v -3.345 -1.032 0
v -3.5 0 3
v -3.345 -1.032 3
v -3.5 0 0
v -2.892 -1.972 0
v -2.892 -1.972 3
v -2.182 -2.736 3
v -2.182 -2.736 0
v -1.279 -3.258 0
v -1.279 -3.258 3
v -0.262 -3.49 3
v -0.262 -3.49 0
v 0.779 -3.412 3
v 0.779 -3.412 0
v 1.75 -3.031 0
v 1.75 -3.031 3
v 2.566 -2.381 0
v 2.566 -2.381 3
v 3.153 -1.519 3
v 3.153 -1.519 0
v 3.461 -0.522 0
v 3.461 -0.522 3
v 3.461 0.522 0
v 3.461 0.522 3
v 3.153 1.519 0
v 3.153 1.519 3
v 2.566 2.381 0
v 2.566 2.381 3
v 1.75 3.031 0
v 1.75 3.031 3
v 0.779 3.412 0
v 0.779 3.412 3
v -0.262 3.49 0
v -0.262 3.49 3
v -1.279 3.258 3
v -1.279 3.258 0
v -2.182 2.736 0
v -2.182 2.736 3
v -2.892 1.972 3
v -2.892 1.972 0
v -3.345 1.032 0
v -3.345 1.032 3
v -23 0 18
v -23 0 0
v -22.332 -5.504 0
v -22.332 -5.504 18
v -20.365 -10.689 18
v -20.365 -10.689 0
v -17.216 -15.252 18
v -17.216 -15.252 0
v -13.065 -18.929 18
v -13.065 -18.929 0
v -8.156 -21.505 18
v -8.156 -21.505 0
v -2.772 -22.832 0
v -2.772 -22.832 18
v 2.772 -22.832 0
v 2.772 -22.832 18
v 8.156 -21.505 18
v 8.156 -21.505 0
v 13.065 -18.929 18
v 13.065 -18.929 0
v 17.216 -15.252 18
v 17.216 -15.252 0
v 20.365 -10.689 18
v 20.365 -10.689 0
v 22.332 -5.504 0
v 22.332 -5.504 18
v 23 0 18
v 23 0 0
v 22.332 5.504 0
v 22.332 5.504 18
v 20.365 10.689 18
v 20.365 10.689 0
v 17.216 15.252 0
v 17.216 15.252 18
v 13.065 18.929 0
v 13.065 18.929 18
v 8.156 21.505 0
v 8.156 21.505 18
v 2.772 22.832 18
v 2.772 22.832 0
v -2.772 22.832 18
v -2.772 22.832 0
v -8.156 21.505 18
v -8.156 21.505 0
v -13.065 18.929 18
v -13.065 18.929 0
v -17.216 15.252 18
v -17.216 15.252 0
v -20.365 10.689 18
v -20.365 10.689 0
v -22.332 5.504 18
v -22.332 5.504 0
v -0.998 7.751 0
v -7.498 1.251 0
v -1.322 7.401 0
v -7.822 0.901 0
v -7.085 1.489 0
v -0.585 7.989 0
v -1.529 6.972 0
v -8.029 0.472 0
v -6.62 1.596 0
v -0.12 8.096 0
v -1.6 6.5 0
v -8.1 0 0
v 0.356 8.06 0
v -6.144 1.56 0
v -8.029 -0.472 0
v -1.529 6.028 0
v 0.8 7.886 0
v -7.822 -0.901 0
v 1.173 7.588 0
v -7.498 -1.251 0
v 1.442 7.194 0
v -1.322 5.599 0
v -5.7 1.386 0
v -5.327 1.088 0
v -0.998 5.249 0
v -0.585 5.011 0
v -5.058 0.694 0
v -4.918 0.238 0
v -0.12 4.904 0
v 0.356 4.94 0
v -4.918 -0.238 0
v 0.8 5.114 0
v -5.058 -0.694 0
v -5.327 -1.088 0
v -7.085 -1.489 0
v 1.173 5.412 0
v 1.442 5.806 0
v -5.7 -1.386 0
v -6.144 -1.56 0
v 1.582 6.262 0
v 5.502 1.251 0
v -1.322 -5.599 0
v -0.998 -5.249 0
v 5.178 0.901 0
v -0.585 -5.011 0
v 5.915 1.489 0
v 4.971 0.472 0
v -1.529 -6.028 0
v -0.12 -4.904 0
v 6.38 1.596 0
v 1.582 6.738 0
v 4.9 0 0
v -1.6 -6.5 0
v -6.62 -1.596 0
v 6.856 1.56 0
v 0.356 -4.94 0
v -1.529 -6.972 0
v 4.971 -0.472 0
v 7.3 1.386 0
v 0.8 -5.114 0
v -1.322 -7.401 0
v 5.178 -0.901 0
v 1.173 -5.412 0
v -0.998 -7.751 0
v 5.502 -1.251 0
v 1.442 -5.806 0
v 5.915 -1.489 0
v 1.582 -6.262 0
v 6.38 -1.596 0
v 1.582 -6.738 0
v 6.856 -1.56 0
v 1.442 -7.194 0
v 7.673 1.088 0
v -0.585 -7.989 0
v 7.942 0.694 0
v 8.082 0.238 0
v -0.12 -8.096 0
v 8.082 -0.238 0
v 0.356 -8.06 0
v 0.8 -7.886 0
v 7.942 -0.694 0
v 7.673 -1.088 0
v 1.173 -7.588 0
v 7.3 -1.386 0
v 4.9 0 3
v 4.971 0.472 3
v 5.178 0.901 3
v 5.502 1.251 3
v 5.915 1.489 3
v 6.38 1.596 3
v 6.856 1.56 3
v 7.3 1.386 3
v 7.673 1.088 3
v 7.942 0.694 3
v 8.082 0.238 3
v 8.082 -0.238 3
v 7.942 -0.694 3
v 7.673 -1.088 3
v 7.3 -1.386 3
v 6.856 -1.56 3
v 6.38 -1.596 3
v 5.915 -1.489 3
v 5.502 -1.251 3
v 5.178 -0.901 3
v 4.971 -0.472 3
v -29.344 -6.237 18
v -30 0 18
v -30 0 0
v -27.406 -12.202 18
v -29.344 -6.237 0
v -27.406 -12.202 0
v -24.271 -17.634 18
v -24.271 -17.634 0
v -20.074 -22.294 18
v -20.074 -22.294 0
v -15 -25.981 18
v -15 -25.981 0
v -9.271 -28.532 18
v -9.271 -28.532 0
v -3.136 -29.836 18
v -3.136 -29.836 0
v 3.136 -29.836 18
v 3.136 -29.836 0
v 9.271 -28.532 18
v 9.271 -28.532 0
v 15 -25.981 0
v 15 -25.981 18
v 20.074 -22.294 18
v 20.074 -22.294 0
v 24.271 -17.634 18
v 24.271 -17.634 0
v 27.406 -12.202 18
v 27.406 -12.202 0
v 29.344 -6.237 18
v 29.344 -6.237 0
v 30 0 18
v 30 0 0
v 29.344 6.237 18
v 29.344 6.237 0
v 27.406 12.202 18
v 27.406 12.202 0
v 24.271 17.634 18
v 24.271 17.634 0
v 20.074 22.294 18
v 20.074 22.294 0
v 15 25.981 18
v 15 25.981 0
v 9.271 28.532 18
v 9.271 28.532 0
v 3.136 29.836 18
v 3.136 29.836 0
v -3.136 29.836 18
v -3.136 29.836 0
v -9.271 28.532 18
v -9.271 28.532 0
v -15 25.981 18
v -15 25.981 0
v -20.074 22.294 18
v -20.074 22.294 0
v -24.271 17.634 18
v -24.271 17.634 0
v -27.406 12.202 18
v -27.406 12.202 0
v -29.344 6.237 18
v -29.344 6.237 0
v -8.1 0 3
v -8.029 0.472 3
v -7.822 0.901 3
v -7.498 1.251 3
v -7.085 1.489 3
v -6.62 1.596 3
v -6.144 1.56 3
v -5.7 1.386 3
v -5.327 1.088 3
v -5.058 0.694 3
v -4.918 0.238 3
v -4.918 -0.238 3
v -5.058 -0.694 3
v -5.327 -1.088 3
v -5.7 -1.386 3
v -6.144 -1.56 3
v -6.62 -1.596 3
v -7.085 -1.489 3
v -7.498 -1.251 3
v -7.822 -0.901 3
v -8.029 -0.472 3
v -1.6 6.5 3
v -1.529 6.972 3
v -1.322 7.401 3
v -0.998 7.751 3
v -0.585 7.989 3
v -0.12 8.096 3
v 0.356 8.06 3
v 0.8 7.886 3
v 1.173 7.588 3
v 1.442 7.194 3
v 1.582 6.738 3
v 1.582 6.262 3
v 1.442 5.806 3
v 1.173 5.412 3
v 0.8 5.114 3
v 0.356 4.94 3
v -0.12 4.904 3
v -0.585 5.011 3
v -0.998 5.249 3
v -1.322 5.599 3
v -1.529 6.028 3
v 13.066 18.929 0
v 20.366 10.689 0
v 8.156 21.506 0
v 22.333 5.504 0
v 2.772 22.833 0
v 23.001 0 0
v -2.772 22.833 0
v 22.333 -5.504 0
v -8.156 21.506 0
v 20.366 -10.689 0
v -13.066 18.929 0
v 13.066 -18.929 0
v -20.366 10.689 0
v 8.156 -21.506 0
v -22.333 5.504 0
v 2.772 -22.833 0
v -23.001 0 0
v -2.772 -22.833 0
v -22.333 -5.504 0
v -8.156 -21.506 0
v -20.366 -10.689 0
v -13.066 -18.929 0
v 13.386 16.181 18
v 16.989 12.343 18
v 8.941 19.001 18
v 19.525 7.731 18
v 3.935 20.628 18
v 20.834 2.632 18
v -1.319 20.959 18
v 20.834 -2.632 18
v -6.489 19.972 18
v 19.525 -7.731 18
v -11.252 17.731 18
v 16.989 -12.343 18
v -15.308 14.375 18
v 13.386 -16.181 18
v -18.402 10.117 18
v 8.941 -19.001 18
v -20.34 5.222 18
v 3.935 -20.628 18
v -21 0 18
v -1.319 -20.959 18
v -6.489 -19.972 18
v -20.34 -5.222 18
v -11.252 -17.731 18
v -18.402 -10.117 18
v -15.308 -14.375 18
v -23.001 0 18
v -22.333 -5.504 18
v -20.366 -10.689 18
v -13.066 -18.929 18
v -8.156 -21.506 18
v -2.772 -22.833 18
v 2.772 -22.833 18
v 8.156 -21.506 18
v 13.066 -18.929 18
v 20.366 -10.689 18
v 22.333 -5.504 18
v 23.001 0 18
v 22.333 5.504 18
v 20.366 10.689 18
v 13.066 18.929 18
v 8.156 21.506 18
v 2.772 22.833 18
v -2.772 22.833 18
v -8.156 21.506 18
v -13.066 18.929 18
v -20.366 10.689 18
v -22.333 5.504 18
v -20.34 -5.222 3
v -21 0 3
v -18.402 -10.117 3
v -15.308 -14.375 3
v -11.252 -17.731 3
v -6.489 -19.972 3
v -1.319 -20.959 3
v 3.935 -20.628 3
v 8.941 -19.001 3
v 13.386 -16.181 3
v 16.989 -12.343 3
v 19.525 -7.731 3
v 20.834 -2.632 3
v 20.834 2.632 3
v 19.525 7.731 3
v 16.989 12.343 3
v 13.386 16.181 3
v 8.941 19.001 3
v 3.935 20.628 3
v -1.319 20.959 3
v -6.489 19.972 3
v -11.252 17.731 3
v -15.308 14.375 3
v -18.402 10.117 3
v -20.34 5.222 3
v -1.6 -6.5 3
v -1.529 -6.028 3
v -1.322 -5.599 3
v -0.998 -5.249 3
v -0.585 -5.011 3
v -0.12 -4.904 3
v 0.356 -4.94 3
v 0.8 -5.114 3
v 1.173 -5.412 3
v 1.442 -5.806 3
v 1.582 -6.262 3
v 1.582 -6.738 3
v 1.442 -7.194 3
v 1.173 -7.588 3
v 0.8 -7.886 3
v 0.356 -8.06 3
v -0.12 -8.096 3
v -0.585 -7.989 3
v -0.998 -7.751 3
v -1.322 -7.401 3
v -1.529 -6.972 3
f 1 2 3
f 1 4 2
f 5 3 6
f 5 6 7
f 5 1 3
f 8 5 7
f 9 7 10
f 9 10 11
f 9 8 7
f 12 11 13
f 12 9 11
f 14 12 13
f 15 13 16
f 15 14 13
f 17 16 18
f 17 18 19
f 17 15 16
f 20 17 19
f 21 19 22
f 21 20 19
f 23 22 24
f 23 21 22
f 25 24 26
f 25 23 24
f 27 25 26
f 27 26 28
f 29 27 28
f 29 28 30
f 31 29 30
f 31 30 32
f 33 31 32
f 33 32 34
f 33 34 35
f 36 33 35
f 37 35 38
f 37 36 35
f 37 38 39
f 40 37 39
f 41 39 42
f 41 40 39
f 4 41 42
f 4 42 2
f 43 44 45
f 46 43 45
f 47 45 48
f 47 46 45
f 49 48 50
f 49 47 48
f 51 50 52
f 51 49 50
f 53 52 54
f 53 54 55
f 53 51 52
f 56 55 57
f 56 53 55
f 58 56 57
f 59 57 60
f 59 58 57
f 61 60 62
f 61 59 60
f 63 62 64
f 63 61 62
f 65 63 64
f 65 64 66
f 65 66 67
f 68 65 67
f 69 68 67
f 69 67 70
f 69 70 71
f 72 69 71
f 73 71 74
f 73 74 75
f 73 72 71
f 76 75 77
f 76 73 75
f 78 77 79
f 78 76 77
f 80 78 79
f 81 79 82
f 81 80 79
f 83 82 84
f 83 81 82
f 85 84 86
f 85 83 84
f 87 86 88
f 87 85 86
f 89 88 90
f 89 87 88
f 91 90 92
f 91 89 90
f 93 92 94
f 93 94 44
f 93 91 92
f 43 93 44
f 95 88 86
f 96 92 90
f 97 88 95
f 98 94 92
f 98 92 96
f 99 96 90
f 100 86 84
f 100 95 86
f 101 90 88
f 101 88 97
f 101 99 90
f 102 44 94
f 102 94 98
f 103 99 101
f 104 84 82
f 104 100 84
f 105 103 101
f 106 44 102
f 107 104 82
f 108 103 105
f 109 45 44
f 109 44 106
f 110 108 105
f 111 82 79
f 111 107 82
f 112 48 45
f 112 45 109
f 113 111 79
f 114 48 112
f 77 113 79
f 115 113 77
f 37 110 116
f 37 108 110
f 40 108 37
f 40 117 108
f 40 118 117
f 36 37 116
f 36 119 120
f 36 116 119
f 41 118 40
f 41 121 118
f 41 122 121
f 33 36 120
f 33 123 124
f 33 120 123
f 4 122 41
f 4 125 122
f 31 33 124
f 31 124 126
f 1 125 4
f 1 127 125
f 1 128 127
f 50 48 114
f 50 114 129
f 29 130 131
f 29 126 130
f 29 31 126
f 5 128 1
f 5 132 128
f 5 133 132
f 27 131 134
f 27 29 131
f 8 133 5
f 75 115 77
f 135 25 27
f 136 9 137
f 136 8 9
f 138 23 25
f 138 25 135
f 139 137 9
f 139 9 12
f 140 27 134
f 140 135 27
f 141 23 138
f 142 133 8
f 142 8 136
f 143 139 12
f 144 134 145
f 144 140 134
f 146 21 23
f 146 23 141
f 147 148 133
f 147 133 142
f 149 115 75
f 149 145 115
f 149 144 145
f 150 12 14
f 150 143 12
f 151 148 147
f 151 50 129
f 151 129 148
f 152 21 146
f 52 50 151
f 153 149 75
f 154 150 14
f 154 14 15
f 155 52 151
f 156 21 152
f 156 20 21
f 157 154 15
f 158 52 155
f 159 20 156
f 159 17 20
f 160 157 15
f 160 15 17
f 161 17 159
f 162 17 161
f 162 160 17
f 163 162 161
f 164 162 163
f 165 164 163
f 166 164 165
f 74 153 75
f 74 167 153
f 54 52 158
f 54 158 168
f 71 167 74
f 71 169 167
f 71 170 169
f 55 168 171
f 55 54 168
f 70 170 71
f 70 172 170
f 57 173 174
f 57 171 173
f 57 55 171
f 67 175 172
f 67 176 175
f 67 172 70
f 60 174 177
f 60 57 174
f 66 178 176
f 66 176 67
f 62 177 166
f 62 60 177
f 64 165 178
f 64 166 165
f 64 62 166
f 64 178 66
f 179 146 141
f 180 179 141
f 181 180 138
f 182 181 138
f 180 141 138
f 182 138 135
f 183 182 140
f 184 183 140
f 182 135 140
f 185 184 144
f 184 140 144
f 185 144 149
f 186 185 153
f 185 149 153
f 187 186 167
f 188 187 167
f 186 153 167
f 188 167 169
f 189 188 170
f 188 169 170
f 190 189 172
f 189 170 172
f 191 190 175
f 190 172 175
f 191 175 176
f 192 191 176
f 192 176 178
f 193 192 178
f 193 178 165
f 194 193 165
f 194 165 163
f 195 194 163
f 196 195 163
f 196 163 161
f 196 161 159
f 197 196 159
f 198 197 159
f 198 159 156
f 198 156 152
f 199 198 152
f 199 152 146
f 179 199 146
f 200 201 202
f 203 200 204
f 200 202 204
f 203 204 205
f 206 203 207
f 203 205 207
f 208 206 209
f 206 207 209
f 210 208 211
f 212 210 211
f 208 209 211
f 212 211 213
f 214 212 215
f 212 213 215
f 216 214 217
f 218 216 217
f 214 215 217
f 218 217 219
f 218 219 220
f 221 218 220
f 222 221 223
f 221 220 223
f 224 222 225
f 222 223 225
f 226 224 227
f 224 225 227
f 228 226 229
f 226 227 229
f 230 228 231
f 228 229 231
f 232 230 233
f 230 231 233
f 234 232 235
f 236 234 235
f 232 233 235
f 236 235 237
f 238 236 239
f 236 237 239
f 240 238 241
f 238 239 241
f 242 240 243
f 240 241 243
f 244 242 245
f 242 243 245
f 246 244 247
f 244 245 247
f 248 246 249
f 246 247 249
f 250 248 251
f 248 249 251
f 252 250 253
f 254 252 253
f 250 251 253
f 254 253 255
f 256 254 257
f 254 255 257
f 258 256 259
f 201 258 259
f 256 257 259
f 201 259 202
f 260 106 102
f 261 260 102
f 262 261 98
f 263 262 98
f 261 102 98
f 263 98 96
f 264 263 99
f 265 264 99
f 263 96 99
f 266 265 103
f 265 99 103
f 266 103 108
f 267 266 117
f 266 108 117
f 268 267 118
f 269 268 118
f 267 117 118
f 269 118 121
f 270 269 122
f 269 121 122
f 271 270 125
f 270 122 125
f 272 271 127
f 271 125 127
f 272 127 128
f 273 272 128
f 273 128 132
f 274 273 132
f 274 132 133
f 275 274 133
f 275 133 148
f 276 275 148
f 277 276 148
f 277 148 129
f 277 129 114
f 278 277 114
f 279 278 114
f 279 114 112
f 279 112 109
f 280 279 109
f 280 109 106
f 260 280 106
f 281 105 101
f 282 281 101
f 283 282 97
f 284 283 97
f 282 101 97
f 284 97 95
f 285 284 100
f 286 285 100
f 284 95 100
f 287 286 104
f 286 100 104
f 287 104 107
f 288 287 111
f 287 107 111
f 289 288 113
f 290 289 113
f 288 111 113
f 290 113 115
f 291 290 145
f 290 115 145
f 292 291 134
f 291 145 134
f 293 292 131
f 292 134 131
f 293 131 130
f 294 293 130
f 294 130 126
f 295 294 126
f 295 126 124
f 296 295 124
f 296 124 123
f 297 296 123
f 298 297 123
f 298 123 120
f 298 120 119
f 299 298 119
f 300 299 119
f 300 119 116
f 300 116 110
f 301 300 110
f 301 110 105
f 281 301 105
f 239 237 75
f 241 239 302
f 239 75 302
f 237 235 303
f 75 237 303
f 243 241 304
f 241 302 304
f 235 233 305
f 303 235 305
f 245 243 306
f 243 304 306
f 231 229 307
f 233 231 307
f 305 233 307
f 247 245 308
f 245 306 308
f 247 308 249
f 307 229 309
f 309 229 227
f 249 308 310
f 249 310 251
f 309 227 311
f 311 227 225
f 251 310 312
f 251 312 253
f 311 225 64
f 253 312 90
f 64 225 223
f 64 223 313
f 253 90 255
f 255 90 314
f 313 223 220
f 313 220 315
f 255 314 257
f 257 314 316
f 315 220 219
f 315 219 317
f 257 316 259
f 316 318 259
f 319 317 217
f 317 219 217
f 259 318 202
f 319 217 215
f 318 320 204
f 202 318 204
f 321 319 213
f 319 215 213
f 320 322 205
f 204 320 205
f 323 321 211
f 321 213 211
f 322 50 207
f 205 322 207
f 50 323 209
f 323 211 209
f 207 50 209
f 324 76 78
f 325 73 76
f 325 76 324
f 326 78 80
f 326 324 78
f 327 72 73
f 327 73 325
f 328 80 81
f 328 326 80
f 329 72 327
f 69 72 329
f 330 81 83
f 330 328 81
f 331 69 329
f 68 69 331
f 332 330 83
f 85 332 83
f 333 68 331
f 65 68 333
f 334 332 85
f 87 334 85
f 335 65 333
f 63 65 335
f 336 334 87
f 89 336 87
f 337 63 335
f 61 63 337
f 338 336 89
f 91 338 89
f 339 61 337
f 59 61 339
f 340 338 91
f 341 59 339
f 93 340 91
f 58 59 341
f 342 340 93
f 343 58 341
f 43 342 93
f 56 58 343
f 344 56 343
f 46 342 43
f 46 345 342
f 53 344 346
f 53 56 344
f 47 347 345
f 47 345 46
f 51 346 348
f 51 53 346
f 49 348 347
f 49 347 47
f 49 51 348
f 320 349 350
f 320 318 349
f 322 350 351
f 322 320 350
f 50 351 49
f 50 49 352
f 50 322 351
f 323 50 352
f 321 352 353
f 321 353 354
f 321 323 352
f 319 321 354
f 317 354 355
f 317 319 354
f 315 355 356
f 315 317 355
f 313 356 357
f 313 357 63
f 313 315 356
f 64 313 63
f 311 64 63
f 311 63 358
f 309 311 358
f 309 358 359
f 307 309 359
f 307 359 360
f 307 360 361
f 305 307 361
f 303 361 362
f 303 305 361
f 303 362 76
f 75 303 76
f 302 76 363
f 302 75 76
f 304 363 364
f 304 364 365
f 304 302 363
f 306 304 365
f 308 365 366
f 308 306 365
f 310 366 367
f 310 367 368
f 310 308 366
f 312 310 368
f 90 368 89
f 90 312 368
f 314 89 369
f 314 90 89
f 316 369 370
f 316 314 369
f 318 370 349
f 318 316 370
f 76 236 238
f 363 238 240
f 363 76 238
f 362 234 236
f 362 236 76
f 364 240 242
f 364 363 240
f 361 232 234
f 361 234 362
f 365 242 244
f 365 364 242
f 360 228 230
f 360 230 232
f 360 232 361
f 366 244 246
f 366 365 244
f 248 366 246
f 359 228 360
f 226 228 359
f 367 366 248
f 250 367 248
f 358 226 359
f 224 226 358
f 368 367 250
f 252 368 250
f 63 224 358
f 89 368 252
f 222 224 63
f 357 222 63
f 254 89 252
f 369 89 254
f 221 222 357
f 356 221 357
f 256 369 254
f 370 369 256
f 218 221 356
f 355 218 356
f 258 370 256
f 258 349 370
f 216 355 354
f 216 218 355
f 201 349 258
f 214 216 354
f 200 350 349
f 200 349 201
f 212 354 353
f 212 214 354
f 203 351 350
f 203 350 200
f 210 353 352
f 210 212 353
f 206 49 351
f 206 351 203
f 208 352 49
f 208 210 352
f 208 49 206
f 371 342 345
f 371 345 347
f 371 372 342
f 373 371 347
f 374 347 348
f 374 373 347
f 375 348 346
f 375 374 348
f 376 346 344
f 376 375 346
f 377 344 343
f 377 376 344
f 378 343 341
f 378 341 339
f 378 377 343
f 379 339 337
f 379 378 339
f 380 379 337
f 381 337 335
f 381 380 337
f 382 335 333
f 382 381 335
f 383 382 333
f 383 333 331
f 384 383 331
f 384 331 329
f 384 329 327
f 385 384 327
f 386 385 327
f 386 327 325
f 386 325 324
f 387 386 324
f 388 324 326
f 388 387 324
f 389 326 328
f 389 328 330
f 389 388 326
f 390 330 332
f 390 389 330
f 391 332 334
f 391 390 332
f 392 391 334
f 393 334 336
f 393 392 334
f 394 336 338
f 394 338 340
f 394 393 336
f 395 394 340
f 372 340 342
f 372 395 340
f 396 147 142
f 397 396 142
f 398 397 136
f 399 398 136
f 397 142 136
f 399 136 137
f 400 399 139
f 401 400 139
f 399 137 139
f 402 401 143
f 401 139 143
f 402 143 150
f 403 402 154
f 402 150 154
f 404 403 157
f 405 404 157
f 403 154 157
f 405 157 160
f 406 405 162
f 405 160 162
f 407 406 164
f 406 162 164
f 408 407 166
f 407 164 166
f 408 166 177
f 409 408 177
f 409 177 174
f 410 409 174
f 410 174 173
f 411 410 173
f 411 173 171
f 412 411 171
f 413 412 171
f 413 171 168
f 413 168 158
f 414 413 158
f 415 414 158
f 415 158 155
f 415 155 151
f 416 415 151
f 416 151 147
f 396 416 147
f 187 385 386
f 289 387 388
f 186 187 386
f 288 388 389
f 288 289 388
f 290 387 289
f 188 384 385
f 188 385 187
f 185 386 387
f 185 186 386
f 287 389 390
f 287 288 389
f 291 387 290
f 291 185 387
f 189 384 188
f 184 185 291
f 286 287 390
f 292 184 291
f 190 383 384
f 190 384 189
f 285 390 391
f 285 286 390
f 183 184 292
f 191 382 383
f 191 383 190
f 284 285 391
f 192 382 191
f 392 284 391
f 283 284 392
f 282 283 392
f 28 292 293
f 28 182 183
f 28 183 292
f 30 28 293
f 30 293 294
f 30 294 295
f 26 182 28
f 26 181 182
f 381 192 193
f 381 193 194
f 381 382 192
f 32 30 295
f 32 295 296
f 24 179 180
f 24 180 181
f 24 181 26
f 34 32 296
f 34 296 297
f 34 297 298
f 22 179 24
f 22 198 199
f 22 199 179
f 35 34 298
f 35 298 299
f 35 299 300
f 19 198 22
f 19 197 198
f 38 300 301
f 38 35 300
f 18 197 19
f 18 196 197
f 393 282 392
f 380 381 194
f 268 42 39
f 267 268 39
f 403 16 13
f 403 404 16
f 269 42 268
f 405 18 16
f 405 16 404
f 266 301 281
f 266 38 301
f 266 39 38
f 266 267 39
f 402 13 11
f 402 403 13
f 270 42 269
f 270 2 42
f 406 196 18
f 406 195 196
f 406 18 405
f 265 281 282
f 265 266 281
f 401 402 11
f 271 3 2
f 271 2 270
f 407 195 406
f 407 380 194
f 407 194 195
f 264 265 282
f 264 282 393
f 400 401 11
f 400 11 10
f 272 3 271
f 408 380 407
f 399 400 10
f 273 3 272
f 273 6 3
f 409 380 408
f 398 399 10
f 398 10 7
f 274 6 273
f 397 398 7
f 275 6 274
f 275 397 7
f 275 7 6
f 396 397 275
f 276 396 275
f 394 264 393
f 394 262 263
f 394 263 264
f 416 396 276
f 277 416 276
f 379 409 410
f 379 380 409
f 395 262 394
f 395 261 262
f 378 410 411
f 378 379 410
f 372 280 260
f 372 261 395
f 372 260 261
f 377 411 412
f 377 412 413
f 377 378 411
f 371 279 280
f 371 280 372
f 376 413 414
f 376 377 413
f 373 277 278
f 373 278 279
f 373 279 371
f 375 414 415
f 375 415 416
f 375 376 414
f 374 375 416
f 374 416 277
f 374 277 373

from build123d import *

# Parameters (mm, degrees)
SKETCH_2_R          = 1.6
CUT_EXTRUDE_1_DEPTH = 10
SKETCH_3_W          = 6.999
SKETCH_3_H          = 18


with BuildPart() as part:
    # 草图1 → 旋转1 (revolve)
    with BuildSketch(Plane(origin=(0, 0, 0), x_dir=(1, 0, 0), z_dir=(0, 1, 0))):
        Polygon((-3.5, 0), (-23, 0), (-23, -18), (-21, -18), (-21, -3), (-3.5, -3), align=None)
    revolve(axis=Axis((0, 0, 0), (0, 0, 1)))

    # 草图2 → 切除-拉伸1 (cut)
    with BuildSketch(Plane(origin=(0, 0, 0), x_dir=(-1, 0, 0), z_dir=(0, 0, -1))):
        with Locations((6.5, 0)):
            Circle(SKETCH_2_R)
        with Locations((0, -6.5)):
            Circle(SKETCH_2_R)
        with Locations((-6.5, 0)):
            Circle(SKETCH_2_R)
        with Locations((0, 6.5)):
            Circle(SKETCH_2_R)
    extrude(amount=-CUT_EXTRUDE_1_DEPTH, mode=Mode.SUBTRACT)


with BuildPart() as body_2:
    # 草图3 → 旋转2 (revolve)
    with BuildSketch(Plane(origin=(0, 0, 0), x_dir=(1, 0, 0), z_dir=(0, 1, 0))):
        with Locations((-26.5005, -9)):
            Rectangle(SKETCH_3_W, SKETCH_3_H)
    revolve(axis=Axis((0, 0, 0), (0, 0, 1)))


solid = Compound([part.part, body_2.part])
